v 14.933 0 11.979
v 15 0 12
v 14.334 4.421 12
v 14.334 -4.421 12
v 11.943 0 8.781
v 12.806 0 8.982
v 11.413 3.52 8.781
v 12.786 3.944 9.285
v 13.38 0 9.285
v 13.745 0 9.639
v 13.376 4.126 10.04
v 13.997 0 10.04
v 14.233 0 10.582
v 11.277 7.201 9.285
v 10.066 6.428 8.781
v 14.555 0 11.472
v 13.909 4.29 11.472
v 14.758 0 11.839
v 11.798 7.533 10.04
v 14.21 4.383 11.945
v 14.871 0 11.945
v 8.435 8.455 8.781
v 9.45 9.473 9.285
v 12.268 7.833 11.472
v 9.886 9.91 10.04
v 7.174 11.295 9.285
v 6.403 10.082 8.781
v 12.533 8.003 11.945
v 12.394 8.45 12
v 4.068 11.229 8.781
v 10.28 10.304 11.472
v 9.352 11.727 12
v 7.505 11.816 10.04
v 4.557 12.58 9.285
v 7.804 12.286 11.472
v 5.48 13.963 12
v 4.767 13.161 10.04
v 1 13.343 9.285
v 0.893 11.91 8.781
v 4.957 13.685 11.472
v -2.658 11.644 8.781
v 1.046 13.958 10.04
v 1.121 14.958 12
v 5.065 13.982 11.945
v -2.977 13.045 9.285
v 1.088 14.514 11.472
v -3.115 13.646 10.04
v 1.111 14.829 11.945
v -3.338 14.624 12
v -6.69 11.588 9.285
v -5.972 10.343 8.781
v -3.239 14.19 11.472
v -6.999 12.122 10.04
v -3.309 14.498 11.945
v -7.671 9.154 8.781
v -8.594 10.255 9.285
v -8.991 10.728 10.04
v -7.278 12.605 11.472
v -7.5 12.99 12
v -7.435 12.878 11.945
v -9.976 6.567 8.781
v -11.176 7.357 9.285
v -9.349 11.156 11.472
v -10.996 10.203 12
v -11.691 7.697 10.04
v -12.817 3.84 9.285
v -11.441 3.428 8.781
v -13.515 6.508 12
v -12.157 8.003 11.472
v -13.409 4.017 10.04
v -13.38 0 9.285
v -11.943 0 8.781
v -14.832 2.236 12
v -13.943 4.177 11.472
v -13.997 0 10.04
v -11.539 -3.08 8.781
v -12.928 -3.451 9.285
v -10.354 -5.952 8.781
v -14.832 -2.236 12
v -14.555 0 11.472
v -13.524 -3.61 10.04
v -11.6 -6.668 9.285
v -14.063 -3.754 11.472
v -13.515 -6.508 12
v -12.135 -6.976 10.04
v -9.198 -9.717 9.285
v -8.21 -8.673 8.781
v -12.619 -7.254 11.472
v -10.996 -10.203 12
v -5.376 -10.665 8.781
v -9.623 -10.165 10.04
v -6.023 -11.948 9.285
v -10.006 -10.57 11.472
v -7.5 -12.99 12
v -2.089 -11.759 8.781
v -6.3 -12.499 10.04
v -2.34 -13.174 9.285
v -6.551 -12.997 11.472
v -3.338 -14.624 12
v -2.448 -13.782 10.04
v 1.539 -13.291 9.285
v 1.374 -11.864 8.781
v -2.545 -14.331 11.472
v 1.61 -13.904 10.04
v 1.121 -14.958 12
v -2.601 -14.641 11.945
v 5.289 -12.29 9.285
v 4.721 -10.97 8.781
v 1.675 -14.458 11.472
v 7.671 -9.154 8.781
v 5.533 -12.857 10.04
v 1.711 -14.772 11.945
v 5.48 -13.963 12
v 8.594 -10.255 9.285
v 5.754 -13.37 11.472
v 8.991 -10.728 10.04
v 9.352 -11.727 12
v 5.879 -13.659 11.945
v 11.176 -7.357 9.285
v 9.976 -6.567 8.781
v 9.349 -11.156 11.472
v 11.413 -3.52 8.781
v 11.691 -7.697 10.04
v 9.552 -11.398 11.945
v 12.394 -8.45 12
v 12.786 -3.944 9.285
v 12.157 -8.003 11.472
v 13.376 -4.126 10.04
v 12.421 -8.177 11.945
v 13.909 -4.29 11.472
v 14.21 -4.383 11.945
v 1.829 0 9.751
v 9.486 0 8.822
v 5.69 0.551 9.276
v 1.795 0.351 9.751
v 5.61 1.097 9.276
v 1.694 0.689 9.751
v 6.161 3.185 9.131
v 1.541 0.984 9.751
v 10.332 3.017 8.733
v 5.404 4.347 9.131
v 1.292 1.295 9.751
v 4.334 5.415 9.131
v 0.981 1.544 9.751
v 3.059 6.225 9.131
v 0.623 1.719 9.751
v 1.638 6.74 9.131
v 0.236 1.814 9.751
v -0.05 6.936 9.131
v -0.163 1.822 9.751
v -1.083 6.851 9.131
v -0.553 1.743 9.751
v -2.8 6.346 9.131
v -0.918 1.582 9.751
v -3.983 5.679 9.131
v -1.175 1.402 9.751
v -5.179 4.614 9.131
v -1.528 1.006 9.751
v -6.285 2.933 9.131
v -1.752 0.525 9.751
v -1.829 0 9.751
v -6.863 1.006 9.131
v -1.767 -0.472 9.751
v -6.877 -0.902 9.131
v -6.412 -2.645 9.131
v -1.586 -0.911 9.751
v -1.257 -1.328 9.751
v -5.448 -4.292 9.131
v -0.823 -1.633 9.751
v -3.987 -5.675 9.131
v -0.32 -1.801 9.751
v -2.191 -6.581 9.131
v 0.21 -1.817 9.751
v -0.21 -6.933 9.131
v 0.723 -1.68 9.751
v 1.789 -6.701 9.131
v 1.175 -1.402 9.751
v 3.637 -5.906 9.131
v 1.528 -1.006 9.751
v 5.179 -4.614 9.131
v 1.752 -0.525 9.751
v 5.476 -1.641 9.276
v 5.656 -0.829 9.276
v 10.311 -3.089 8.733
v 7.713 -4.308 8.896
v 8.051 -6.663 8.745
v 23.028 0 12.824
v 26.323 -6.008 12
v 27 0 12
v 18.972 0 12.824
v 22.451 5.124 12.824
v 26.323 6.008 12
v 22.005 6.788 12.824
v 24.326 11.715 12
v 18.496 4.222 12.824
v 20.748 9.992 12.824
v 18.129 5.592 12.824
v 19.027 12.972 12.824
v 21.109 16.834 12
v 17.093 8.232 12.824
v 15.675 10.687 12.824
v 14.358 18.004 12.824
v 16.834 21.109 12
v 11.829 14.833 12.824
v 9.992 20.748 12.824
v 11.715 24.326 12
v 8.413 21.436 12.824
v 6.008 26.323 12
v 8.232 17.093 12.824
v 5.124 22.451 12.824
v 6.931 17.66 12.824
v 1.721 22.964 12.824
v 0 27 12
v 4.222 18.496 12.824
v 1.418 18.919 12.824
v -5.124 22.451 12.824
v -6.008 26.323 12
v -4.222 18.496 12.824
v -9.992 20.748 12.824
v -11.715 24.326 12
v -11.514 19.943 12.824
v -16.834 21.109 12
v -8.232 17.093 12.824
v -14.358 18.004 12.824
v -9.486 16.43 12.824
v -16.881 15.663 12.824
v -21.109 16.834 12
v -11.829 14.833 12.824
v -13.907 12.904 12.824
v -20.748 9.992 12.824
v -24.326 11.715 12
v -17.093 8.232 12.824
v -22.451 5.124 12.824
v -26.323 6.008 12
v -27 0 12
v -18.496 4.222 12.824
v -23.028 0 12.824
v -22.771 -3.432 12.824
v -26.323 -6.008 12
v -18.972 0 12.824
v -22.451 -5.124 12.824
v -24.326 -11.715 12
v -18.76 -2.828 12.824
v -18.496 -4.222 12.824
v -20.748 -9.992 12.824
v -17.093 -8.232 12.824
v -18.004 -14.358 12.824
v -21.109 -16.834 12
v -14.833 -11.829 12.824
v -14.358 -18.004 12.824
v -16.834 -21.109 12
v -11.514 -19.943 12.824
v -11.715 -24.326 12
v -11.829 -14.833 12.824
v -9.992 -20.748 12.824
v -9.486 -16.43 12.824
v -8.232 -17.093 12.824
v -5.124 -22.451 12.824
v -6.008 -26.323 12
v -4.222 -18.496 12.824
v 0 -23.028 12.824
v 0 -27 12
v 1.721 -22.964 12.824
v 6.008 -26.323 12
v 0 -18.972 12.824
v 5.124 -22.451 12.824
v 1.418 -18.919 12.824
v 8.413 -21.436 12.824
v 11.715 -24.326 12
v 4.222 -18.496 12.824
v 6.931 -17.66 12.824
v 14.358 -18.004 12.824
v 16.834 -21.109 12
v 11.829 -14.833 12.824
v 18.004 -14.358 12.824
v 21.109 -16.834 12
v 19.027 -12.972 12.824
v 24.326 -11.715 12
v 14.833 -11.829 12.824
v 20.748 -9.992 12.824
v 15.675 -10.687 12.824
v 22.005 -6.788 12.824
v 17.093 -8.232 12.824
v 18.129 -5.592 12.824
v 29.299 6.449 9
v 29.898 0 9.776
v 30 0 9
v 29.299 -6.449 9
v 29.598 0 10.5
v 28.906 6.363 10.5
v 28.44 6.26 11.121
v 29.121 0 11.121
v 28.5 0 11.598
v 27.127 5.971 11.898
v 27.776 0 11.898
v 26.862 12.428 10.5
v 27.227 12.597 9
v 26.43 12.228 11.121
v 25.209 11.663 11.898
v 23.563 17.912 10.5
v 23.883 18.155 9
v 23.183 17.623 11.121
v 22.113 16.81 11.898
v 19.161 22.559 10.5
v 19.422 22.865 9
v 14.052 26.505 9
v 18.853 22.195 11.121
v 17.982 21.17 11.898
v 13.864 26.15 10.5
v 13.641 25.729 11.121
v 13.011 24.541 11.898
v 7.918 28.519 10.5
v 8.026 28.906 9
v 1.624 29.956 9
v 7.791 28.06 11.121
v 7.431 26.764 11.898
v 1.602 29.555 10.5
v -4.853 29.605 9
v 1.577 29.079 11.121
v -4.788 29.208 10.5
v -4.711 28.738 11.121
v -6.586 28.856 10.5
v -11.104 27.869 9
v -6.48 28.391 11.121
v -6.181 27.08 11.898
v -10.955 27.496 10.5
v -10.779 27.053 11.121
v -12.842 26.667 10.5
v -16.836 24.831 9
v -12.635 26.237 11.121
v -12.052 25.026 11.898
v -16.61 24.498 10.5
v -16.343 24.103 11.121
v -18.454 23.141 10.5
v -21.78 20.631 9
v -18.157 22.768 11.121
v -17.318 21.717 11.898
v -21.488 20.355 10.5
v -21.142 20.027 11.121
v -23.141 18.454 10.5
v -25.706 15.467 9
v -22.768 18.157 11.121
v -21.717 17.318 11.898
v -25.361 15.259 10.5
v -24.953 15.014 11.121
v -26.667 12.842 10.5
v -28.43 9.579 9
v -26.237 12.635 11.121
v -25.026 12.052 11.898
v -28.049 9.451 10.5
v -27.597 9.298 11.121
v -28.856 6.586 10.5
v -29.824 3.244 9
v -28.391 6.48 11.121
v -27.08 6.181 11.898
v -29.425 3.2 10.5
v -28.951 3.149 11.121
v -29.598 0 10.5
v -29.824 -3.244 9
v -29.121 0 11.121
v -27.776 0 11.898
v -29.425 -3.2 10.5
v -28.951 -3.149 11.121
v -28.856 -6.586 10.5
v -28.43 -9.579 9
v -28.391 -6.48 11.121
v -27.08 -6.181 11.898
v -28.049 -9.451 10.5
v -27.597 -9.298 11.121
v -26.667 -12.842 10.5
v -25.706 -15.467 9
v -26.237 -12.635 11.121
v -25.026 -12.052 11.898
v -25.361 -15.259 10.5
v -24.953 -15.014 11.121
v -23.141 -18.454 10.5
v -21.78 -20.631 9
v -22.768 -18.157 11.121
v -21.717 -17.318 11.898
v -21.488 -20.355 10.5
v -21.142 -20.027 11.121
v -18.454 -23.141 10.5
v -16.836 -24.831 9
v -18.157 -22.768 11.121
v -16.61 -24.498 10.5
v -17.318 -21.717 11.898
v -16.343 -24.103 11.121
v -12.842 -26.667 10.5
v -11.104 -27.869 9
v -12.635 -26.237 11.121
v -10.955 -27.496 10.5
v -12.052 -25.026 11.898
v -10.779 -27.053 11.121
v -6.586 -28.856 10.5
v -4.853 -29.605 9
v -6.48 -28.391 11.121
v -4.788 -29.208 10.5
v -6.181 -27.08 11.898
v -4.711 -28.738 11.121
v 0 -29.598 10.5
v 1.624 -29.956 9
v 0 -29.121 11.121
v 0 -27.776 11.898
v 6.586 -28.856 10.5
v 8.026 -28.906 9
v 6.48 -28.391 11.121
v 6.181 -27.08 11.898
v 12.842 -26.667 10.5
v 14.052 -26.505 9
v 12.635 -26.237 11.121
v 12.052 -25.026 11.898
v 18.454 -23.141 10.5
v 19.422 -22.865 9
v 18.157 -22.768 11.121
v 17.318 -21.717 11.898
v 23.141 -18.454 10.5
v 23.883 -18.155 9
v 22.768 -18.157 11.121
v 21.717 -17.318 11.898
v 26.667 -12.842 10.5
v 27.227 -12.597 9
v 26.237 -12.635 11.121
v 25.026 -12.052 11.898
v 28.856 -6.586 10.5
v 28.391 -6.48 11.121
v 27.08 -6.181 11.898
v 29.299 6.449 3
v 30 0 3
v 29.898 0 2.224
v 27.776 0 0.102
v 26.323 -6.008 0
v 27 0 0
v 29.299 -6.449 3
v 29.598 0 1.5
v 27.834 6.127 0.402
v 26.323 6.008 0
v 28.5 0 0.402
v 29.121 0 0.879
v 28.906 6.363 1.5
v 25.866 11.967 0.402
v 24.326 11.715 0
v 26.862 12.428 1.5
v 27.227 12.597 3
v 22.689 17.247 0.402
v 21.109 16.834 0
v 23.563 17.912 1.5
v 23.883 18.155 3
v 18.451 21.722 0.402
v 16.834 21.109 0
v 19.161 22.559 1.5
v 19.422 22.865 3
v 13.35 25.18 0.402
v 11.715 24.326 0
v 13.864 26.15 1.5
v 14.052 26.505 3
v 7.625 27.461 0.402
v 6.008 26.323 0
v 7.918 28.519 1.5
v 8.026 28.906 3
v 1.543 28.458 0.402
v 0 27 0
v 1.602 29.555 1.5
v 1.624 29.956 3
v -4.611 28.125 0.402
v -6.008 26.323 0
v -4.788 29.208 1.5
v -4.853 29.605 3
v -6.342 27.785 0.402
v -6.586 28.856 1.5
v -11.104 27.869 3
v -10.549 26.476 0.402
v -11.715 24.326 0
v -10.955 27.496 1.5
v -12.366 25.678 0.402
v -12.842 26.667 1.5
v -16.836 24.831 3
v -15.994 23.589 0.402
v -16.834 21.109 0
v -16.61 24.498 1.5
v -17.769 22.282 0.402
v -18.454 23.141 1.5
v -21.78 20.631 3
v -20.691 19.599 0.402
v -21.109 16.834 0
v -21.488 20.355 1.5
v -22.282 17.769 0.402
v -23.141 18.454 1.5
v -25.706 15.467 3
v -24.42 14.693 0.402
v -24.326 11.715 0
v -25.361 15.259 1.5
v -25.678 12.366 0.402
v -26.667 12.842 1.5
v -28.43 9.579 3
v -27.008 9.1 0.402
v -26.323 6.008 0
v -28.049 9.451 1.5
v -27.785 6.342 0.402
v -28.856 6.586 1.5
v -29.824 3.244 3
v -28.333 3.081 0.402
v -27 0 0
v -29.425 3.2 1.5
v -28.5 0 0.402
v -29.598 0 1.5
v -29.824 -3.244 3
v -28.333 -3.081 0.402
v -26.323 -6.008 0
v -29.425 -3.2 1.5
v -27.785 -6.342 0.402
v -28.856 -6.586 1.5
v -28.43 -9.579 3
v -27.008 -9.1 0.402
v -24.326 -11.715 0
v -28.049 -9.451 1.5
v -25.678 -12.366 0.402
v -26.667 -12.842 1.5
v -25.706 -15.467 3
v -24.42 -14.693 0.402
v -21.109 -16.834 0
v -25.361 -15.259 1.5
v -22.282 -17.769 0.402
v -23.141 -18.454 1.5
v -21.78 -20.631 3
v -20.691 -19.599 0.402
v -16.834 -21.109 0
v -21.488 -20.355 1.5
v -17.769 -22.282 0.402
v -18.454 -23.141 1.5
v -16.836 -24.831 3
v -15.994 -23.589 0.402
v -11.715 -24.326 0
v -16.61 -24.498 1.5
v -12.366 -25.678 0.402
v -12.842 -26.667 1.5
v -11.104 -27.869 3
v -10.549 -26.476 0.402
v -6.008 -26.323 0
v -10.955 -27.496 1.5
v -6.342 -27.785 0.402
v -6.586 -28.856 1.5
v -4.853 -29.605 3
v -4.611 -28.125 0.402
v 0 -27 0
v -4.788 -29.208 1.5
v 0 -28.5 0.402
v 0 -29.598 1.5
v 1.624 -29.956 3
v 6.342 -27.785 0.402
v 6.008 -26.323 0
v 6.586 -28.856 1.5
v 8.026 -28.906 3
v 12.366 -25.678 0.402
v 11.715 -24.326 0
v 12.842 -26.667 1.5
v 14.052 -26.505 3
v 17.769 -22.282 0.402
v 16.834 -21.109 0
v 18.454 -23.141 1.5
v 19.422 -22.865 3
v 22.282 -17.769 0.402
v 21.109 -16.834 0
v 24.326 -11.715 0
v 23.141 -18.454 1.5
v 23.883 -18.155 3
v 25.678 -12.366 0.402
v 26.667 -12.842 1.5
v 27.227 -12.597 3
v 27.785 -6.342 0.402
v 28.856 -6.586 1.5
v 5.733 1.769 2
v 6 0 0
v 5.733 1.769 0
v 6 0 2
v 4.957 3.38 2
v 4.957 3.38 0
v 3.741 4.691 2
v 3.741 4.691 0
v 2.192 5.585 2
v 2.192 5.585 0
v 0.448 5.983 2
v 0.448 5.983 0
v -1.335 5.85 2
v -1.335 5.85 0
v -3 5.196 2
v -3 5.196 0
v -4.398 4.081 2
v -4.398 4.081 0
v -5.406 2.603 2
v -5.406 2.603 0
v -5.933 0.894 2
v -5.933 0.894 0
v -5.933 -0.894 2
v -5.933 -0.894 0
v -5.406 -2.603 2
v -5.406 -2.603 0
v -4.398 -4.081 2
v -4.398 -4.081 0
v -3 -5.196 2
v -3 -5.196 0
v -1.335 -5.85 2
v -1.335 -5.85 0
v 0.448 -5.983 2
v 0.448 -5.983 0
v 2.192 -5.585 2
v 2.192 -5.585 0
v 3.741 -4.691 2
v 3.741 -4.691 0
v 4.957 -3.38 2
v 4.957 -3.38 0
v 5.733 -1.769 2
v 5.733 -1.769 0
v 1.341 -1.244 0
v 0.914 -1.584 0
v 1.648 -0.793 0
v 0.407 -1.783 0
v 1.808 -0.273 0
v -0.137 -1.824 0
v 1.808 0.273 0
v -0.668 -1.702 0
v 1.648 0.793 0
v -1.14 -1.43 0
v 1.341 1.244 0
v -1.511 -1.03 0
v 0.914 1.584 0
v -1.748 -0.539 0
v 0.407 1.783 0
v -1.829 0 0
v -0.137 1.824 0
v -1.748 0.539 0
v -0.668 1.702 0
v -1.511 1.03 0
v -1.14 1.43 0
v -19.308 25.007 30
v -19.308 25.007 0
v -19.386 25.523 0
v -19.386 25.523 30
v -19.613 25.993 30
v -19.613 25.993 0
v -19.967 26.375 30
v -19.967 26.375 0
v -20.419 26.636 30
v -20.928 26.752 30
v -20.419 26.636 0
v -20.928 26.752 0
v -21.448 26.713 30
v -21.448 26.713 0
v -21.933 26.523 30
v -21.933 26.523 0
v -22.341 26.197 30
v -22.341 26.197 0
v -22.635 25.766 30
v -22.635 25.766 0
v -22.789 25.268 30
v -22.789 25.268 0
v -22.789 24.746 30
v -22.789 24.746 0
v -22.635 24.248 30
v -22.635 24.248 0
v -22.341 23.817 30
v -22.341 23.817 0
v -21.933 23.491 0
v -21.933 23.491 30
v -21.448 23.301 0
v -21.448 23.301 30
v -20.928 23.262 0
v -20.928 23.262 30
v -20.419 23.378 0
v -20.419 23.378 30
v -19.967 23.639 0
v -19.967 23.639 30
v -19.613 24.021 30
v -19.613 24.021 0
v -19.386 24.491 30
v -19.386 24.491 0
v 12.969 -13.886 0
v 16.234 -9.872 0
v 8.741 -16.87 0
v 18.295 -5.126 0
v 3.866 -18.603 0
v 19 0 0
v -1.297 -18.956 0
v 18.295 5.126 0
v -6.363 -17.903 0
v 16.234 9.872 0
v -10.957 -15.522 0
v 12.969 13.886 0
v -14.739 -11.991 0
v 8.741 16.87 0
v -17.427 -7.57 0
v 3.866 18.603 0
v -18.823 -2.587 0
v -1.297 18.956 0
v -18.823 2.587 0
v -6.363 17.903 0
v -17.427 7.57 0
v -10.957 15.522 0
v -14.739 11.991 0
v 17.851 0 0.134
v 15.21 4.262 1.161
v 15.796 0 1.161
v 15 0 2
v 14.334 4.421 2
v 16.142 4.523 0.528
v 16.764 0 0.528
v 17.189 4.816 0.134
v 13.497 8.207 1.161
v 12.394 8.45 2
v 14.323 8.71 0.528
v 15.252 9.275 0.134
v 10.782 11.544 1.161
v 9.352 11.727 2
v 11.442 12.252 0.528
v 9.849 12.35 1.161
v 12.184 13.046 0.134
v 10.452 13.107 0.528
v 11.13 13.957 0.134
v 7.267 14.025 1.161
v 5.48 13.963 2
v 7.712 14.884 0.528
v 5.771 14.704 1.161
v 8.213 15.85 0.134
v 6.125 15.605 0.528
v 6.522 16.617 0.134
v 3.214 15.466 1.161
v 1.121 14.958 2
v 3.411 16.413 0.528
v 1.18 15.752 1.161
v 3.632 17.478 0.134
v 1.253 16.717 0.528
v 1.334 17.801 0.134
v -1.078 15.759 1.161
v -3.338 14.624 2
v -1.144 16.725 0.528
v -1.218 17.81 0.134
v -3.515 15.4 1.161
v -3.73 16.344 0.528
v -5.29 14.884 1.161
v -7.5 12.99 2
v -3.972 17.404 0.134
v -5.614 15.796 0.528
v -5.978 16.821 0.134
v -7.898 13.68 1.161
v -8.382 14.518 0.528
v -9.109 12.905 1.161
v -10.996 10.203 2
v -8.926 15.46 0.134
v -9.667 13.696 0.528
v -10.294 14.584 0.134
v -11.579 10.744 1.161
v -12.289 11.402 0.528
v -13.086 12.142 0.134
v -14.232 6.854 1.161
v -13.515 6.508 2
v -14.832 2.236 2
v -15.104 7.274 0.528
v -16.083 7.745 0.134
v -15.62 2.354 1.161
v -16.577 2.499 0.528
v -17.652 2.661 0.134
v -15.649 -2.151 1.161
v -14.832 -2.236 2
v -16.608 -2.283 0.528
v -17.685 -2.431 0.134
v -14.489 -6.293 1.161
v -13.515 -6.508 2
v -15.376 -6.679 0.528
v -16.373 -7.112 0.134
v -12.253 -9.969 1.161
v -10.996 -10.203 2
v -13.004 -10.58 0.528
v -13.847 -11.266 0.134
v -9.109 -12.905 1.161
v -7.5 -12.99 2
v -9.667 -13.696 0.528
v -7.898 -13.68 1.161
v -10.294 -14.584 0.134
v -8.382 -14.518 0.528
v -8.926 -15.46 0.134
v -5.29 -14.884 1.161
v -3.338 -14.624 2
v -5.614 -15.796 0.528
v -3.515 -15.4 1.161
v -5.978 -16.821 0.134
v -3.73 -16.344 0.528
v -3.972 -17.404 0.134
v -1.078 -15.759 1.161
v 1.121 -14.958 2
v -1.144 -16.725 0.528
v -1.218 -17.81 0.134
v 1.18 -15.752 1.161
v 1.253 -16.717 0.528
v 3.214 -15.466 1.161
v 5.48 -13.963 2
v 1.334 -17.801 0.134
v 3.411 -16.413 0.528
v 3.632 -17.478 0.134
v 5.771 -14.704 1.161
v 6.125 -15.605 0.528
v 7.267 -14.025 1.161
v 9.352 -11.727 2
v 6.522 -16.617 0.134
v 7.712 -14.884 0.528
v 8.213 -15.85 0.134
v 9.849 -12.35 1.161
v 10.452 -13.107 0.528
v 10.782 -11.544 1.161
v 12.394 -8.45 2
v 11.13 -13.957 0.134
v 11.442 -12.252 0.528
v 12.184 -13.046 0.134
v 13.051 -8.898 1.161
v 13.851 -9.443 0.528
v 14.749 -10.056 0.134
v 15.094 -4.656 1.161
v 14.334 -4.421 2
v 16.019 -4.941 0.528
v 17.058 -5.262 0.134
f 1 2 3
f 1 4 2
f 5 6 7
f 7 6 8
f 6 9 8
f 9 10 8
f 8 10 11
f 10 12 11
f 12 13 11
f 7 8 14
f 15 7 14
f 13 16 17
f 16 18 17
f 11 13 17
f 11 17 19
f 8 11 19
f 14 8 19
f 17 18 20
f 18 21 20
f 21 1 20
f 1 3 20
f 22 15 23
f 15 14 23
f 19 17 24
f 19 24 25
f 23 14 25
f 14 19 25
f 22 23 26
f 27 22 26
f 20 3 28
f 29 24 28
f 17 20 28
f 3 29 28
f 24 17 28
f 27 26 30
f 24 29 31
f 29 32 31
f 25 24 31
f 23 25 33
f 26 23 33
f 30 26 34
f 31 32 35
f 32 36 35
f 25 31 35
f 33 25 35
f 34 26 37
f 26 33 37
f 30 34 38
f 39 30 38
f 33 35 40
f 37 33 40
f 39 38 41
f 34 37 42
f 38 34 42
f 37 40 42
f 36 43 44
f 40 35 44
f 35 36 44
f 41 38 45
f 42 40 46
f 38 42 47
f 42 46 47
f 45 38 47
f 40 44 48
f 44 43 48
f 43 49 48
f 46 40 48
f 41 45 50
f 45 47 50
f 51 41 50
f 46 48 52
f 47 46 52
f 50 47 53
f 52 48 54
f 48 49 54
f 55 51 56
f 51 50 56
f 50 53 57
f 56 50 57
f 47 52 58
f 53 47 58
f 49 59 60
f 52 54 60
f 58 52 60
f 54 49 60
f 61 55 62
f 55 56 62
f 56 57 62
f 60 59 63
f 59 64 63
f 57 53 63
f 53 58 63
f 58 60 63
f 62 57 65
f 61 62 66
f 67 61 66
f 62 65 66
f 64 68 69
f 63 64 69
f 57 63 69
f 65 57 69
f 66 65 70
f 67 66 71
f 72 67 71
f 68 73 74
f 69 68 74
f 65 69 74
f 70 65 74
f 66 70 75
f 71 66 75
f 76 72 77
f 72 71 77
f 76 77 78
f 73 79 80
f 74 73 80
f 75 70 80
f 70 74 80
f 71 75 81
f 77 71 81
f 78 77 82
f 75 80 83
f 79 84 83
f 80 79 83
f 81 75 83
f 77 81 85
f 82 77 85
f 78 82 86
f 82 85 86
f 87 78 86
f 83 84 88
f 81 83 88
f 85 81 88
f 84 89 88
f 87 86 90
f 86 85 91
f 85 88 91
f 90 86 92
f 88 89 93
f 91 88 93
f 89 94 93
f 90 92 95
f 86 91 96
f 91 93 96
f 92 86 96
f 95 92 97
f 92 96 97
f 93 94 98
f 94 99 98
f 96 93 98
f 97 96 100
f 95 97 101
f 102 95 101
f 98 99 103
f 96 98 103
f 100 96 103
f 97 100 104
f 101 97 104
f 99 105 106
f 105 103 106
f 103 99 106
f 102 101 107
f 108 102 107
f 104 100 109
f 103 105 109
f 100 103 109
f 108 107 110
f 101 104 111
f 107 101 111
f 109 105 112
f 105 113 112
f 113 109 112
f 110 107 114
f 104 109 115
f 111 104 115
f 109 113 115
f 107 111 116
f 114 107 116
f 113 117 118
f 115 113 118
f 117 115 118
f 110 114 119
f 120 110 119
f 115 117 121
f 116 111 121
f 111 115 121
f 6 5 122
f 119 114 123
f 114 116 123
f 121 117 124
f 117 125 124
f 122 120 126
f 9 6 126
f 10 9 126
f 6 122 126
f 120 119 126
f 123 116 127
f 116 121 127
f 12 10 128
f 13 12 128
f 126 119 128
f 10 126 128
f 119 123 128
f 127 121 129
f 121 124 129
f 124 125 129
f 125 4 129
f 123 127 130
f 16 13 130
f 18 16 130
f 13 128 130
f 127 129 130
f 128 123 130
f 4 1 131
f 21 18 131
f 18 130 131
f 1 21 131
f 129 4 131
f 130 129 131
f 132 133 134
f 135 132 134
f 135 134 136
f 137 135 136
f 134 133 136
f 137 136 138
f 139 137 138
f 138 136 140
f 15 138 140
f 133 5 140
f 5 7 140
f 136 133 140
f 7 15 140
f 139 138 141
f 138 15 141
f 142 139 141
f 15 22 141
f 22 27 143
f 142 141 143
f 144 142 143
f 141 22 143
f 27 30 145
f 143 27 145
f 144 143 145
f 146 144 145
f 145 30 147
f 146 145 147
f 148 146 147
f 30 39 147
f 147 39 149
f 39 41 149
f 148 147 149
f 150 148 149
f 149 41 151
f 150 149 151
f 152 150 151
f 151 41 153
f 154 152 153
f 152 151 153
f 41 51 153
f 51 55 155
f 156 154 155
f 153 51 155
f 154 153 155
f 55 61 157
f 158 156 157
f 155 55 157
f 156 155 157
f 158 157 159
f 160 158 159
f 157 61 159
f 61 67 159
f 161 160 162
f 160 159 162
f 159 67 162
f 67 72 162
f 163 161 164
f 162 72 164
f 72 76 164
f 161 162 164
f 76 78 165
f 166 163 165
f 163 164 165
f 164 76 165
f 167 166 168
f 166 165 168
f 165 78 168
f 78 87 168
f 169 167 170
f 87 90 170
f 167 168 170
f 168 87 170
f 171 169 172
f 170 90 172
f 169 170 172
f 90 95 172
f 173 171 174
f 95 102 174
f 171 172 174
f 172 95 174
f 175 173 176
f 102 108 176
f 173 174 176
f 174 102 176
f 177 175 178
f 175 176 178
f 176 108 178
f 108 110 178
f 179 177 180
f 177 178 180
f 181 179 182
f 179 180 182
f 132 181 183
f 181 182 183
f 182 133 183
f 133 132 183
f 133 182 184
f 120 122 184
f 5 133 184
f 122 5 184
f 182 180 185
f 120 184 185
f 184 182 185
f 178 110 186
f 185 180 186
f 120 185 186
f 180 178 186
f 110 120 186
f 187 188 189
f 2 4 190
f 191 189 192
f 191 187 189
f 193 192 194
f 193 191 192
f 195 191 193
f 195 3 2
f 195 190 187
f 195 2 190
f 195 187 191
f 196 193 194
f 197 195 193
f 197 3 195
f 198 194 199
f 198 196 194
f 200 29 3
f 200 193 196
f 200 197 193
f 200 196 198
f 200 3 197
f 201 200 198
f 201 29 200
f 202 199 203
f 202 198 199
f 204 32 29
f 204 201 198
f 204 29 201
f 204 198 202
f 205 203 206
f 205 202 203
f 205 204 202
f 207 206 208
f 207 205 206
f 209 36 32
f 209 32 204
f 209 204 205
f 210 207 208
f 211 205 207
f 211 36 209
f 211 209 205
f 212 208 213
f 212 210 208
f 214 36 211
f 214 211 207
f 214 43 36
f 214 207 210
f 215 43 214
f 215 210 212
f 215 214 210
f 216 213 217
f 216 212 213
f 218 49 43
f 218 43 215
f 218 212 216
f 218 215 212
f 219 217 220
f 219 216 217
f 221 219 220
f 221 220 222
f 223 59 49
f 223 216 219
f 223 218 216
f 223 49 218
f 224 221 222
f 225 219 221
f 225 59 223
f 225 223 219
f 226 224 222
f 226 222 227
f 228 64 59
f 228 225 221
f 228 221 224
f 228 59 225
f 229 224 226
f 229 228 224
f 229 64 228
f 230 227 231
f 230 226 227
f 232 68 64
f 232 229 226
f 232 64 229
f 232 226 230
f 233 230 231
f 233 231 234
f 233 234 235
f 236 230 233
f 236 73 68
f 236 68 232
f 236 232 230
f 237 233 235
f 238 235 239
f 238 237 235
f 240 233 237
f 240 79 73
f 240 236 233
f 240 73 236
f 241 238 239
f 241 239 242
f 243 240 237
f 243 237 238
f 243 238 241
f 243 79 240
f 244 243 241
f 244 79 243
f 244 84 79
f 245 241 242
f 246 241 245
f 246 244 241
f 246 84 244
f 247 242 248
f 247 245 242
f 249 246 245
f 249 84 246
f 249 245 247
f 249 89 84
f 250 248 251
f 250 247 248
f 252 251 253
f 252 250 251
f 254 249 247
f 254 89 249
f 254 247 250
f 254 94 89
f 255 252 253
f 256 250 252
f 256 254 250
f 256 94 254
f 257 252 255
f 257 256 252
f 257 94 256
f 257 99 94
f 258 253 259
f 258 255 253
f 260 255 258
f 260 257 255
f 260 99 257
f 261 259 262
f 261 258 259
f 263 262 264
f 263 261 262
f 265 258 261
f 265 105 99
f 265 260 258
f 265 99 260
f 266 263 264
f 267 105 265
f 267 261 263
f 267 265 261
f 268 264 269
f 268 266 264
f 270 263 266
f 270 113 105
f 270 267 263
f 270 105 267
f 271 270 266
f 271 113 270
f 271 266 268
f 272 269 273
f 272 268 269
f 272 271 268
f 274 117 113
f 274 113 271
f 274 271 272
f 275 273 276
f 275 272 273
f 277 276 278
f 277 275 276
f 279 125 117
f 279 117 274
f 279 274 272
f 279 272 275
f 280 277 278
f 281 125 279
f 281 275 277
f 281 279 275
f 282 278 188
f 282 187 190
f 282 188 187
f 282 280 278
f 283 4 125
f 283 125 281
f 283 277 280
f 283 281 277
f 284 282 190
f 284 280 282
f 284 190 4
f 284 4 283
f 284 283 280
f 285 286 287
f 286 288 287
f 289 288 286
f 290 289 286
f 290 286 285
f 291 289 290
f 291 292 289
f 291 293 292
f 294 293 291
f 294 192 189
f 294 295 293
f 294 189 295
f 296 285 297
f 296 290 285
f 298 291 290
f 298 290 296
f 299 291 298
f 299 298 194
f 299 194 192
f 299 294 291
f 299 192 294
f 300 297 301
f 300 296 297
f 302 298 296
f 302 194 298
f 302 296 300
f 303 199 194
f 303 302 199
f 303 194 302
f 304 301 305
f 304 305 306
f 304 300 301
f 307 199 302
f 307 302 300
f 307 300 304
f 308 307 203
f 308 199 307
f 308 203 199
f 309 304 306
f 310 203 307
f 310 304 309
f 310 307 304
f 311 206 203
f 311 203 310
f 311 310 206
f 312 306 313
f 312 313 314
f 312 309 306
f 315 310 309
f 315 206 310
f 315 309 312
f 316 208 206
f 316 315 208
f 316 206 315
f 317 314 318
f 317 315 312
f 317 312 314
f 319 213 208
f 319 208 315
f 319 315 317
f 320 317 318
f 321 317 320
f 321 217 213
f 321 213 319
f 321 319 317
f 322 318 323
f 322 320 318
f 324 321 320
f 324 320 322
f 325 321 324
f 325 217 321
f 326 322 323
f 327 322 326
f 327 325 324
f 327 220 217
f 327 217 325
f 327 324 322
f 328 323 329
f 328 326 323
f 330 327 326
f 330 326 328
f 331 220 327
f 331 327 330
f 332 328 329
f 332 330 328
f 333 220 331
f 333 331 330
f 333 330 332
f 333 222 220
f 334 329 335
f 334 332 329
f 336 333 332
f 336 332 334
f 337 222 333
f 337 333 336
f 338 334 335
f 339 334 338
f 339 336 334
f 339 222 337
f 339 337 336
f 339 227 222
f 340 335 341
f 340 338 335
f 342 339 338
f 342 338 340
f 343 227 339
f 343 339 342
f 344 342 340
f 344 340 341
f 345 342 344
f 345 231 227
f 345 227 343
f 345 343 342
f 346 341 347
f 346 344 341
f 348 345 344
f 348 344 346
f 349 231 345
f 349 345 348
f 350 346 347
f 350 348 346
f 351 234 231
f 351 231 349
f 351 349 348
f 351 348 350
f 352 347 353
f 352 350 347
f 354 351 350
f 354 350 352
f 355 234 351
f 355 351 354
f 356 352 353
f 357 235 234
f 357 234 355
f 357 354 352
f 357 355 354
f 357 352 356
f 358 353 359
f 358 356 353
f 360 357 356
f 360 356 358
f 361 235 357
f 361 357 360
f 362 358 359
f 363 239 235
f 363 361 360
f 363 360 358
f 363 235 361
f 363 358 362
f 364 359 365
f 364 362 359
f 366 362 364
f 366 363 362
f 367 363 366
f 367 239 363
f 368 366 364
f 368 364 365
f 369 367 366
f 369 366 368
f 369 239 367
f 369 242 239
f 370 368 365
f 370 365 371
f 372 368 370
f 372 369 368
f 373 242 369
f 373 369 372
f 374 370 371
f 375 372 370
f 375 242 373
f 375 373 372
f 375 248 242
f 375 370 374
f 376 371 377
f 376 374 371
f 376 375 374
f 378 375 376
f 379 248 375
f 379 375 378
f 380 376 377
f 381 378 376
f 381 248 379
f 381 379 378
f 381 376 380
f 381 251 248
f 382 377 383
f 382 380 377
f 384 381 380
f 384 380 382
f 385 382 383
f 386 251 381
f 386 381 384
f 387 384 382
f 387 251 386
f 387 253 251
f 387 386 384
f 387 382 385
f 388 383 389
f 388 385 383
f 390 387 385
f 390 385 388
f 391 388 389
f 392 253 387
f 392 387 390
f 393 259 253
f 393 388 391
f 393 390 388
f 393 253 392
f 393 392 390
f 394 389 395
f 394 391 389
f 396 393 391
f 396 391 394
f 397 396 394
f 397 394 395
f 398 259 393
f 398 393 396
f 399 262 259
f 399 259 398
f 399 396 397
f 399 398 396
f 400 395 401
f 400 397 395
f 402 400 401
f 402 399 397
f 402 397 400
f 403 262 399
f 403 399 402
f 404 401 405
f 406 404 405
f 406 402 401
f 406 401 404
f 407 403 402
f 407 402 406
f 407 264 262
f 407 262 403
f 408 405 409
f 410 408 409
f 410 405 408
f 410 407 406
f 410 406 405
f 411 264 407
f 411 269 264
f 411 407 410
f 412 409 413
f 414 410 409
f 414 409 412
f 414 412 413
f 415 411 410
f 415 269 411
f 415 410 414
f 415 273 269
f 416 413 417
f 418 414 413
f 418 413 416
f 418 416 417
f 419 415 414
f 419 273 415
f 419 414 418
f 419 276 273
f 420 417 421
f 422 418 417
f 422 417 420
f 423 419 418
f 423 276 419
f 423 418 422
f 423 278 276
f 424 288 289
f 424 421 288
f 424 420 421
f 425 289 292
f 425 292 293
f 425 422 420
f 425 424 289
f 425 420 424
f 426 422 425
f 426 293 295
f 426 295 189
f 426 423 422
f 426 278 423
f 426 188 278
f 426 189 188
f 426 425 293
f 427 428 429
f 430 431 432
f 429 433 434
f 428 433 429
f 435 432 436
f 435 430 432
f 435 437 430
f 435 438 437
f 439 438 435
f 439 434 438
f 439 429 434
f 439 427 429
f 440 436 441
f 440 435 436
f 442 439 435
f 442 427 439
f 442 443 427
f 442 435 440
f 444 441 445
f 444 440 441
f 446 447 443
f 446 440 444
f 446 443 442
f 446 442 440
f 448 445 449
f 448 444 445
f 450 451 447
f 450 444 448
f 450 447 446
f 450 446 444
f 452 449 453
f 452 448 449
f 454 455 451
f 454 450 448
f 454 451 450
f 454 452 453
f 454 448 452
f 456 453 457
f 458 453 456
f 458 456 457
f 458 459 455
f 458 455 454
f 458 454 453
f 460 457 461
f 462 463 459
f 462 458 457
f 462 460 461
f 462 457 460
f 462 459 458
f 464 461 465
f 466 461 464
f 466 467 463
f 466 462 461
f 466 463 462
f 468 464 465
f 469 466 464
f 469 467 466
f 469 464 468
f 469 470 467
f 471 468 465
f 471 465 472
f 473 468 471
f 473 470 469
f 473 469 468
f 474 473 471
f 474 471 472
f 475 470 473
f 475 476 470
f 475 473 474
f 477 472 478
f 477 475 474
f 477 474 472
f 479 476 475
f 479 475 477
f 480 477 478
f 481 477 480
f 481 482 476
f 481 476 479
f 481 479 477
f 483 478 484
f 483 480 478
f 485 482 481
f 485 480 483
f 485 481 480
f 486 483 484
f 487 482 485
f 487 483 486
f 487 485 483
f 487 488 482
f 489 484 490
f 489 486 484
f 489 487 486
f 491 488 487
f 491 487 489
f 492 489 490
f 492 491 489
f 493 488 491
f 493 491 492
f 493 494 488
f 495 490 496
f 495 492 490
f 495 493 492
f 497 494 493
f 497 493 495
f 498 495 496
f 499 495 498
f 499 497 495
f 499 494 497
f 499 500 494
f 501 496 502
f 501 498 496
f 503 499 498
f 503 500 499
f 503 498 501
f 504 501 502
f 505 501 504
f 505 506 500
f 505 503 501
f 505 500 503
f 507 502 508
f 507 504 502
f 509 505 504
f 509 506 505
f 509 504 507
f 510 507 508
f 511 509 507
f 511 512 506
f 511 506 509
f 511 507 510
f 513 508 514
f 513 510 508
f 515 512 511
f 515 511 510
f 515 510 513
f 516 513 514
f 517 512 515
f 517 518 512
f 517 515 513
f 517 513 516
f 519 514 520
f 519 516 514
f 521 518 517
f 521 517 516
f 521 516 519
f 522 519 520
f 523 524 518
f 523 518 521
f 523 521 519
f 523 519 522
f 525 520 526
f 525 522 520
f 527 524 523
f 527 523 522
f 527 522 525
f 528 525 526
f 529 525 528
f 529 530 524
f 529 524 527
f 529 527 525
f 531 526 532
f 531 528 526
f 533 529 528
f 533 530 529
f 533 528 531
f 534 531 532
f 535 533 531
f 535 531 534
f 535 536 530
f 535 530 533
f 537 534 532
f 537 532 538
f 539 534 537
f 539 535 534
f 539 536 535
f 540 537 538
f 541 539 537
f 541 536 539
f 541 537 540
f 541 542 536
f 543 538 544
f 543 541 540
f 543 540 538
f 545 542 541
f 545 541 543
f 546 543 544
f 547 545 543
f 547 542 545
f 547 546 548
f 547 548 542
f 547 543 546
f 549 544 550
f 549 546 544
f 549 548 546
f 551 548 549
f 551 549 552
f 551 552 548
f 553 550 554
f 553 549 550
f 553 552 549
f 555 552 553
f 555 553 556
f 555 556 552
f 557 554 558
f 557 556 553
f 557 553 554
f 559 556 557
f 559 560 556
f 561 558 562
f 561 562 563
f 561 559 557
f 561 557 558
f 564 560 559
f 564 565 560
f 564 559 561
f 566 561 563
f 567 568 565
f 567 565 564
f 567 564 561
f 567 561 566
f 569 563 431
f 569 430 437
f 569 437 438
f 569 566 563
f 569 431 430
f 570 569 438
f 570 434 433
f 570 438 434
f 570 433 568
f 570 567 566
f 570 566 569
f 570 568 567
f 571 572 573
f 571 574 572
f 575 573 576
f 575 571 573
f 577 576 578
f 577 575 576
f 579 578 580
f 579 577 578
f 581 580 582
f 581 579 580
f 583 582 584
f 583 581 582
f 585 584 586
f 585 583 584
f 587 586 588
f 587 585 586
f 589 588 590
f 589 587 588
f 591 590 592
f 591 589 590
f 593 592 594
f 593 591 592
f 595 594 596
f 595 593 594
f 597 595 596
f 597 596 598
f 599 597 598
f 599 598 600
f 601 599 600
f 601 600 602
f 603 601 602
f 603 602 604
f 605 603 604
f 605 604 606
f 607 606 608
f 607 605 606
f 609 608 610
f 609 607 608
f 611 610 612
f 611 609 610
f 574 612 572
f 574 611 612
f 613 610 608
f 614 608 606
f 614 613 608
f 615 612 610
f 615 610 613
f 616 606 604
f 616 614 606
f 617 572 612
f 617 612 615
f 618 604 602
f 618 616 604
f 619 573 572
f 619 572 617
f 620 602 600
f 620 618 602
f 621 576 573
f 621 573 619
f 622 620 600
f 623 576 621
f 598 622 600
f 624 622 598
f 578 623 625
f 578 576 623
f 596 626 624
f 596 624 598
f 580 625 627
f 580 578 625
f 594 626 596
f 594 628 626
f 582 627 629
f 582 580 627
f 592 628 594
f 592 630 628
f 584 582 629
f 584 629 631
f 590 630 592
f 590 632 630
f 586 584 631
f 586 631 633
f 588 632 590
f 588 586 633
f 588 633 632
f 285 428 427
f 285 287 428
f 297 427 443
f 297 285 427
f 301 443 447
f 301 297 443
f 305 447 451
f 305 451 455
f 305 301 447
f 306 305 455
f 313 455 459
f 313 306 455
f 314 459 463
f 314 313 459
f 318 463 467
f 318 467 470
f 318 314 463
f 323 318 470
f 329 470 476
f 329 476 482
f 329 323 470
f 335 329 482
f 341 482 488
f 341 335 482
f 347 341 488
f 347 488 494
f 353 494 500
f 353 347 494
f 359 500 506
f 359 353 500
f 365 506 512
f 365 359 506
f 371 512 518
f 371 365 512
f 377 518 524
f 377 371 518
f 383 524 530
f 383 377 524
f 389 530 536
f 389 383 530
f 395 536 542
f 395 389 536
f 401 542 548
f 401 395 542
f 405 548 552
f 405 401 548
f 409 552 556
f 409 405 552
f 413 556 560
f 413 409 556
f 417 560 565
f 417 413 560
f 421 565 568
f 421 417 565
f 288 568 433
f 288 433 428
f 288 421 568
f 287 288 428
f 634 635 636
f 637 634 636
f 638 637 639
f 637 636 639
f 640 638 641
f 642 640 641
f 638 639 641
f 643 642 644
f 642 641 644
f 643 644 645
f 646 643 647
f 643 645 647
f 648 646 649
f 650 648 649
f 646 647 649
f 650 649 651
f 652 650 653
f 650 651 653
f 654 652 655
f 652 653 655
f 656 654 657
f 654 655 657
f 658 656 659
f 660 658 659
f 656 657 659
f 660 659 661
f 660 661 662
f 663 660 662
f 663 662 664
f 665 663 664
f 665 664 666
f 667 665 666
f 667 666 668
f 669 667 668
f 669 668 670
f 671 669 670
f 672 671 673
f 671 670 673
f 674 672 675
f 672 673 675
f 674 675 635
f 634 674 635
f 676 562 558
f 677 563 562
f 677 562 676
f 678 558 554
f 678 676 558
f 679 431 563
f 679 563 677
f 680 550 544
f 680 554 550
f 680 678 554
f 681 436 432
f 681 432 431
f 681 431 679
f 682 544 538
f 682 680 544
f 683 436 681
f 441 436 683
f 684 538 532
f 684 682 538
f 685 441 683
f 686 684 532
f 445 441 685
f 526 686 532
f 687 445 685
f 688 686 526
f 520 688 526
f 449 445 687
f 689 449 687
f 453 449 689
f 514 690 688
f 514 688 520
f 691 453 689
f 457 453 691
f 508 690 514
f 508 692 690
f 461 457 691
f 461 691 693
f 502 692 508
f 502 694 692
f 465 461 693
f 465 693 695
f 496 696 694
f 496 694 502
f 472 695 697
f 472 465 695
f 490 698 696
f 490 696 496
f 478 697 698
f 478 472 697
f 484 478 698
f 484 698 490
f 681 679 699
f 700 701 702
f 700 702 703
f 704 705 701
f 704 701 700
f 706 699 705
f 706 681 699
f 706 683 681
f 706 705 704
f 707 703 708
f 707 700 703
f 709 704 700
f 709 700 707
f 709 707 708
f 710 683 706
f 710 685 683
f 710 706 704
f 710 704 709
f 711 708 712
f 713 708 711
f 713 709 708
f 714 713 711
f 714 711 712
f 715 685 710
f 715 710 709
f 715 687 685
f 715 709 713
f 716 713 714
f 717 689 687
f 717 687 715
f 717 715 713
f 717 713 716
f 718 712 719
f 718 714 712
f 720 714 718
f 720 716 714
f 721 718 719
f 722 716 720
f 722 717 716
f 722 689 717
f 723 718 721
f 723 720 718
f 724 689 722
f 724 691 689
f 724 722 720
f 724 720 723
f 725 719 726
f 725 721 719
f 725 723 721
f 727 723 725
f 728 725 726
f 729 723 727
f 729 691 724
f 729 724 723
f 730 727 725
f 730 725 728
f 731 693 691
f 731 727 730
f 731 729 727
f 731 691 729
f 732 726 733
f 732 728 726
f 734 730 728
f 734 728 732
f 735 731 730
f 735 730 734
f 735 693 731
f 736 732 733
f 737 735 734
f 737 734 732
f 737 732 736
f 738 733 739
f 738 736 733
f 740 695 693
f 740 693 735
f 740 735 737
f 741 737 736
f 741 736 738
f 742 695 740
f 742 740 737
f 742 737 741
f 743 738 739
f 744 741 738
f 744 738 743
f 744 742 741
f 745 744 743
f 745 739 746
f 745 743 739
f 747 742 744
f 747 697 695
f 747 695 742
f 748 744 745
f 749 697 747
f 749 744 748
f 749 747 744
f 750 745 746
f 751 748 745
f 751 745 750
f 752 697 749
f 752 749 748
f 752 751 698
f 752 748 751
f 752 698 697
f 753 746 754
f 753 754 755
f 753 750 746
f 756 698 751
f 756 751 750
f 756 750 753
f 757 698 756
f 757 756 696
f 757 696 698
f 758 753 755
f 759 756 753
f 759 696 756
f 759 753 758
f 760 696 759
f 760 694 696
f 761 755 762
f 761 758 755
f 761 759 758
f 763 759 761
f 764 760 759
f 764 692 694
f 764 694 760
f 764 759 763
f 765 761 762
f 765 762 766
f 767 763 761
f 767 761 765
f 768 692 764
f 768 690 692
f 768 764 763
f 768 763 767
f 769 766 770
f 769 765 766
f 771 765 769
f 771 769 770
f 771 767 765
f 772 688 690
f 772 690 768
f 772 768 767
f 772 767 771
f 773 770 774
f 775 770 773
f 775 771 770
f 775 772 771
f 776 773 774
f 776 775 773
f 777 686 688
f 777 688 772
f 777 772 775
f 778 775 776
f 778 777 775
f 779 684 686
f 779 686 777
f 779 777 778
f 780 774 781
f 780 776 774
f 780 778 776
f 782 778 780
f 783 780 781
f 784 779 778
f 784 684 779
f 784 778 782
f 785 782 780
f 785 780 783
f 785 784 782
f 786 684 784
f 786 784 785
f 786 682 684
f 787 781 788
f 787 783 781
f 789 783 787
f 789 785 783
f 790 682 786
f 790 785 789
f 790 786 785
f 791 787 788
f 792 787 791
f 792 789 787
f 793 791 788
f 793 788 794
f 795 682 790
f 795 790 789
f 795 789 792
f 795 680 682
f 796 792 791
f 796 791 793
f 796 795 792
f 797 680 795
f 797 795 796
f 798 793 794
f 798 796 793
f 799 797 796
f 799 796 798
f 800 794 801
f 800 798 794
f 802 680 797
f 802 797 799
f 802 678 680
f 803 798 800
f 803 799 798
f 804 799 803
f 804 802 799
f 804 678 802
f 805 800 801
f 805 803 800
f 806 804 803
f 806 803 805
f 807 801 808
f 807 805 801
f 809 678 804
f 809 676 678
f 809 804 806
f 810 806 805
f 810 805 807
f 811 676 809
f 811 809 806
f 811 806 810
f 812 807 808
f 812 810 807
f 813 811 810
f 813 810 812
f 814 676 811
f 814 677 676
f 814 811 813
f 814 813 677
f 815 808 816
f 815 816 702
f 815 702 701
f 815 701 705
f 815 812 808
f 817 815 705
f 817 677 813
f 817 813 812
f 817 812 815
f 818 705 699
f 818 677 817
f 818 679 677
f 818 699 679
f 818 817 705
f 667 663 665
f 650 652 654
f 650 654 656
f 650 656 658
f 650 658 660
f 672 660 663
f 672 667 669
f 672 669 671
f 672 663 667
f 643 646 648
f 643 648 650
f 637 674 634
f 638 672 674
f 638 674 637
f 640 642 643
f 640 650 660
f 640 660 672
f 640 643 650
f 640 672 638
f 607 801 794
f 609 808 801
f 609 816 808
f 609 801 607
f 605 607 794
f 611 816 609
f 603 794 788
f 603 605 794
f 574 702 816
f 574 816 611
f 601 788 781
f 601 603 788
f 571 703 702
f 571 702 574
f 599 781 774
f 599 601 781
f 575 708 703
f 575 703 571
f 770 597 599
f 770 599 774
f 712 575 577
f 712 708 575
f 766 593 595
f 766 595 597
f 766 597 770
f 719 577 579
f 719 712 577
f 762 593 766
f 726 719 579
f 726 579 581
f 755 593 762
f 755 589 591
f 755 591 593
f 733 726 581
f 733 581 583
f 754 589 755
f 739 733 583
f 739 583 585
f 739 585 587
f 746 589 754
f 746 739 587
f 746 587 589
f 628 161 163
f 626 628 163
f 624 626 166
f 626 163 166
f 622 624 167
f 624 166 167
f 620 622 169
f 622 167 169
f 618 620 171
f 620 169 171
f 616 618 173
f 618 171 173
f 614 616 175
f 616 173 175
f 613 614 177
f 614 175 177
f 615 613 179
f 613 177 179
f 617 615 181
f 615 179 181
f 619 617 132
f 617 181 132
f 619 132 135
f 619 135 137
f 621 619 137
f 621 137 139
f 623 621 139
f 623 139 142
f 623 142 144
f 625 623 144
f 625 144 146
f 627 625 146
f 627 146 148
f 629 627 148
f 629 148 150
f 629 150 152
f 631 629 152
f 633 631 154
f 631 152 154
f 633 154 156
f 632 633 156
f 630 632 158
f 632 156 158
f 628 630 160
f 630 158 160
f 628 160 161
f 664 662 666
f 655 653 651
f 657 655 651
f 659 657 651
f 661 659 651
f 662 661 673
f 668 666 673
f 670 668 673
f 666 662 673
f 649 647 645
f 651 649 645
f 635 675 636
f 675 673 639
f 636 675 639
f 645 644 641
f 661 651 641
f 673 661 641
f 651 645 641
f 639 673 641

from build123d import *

# Parameters (mm, degrees)
F0_R     = 1.75
F1_DEPTH = 30
F6_D     = 3.6576


# Not quite as in the source:
# - a fillet or chamfer that OpenCascade refuses, or shapes differently, is made with other operations: its cross-section is extruded or revolved along the edge and cut away or added


with BuildPart() as f1:
    # F0 (on Top) → F1 (new body)
    with BuildSketch(Plane.XY):
        with Locations((-21.0584960878, 25.0069648027)):
            Circle(F0_R)
    extrude(amount=F1_DEPTH)


with BuildPart() as f3:
    # F2 (on Front) → F3 (revolve)
    with BuildSketch(Plane.XZ):
        with BuildLine():
            Line((0, 10), (0, 0))
            Line((0, 0), (6, 0))
            Line((6, 0), (6, 2))
            Line((6, 2), (15, 2))
            Line((15, 2), (15, 0))
            Line((15, 0), (27, 0))
            ThreePointArc((27, 0), (29.1213203436, 0.8786796564), (30, 3))
            Line((30, 3), (30, 9))
            ThreePointArc((30, 9), (29.1213203436, 11.1213203436), (27, 12))
            ThreePointArc((27, 12), (21, 12.9280272043), (15, 12))
            add(Edge.make_bspline(
                [(0, 10), (3.294109879, 9.5346706659), (7.2319046155, 9.1457099045), (14.3270360542, 8.1327705449), (14.4332102752, 11.8877358395), (15, 12)],
                knots=[0, 0, 0, 0, 0.4115020239, 0.7567346673, 1, 1, 1, 1], degree=3))
        make_face()
    revolve(axis=Axis((0, 0, 5), (0, 0, 1)))

    # F4: fillet of radius 5 on 1 edges, made by hand

    # F4_s1 → F4_t2 (revolve, cut)
    with BuildSketch(Plane.XZ):
        with BuildLine():
            ThreePointArc((15, 2), (16.7639320225, 0.527864045), (19, 0))
            Line((19, 0), (15, 0))
            Line((15, 0), (15, 2))
        make_face()
    revolve(axis=Axis((0, 0, 0), (0, 0, 1)), mode=Mode.SUBTRACT)

    # F6 (through all)
    with Locations(Plane(origin=(0, 0, 0), x_dir=(1, 0, 0), z_dir=(0, 0, -1))):
        with Locations((0, 0)):
            Hole(F6_D / 2)


solid = Compound([f1.part, f3.part])
